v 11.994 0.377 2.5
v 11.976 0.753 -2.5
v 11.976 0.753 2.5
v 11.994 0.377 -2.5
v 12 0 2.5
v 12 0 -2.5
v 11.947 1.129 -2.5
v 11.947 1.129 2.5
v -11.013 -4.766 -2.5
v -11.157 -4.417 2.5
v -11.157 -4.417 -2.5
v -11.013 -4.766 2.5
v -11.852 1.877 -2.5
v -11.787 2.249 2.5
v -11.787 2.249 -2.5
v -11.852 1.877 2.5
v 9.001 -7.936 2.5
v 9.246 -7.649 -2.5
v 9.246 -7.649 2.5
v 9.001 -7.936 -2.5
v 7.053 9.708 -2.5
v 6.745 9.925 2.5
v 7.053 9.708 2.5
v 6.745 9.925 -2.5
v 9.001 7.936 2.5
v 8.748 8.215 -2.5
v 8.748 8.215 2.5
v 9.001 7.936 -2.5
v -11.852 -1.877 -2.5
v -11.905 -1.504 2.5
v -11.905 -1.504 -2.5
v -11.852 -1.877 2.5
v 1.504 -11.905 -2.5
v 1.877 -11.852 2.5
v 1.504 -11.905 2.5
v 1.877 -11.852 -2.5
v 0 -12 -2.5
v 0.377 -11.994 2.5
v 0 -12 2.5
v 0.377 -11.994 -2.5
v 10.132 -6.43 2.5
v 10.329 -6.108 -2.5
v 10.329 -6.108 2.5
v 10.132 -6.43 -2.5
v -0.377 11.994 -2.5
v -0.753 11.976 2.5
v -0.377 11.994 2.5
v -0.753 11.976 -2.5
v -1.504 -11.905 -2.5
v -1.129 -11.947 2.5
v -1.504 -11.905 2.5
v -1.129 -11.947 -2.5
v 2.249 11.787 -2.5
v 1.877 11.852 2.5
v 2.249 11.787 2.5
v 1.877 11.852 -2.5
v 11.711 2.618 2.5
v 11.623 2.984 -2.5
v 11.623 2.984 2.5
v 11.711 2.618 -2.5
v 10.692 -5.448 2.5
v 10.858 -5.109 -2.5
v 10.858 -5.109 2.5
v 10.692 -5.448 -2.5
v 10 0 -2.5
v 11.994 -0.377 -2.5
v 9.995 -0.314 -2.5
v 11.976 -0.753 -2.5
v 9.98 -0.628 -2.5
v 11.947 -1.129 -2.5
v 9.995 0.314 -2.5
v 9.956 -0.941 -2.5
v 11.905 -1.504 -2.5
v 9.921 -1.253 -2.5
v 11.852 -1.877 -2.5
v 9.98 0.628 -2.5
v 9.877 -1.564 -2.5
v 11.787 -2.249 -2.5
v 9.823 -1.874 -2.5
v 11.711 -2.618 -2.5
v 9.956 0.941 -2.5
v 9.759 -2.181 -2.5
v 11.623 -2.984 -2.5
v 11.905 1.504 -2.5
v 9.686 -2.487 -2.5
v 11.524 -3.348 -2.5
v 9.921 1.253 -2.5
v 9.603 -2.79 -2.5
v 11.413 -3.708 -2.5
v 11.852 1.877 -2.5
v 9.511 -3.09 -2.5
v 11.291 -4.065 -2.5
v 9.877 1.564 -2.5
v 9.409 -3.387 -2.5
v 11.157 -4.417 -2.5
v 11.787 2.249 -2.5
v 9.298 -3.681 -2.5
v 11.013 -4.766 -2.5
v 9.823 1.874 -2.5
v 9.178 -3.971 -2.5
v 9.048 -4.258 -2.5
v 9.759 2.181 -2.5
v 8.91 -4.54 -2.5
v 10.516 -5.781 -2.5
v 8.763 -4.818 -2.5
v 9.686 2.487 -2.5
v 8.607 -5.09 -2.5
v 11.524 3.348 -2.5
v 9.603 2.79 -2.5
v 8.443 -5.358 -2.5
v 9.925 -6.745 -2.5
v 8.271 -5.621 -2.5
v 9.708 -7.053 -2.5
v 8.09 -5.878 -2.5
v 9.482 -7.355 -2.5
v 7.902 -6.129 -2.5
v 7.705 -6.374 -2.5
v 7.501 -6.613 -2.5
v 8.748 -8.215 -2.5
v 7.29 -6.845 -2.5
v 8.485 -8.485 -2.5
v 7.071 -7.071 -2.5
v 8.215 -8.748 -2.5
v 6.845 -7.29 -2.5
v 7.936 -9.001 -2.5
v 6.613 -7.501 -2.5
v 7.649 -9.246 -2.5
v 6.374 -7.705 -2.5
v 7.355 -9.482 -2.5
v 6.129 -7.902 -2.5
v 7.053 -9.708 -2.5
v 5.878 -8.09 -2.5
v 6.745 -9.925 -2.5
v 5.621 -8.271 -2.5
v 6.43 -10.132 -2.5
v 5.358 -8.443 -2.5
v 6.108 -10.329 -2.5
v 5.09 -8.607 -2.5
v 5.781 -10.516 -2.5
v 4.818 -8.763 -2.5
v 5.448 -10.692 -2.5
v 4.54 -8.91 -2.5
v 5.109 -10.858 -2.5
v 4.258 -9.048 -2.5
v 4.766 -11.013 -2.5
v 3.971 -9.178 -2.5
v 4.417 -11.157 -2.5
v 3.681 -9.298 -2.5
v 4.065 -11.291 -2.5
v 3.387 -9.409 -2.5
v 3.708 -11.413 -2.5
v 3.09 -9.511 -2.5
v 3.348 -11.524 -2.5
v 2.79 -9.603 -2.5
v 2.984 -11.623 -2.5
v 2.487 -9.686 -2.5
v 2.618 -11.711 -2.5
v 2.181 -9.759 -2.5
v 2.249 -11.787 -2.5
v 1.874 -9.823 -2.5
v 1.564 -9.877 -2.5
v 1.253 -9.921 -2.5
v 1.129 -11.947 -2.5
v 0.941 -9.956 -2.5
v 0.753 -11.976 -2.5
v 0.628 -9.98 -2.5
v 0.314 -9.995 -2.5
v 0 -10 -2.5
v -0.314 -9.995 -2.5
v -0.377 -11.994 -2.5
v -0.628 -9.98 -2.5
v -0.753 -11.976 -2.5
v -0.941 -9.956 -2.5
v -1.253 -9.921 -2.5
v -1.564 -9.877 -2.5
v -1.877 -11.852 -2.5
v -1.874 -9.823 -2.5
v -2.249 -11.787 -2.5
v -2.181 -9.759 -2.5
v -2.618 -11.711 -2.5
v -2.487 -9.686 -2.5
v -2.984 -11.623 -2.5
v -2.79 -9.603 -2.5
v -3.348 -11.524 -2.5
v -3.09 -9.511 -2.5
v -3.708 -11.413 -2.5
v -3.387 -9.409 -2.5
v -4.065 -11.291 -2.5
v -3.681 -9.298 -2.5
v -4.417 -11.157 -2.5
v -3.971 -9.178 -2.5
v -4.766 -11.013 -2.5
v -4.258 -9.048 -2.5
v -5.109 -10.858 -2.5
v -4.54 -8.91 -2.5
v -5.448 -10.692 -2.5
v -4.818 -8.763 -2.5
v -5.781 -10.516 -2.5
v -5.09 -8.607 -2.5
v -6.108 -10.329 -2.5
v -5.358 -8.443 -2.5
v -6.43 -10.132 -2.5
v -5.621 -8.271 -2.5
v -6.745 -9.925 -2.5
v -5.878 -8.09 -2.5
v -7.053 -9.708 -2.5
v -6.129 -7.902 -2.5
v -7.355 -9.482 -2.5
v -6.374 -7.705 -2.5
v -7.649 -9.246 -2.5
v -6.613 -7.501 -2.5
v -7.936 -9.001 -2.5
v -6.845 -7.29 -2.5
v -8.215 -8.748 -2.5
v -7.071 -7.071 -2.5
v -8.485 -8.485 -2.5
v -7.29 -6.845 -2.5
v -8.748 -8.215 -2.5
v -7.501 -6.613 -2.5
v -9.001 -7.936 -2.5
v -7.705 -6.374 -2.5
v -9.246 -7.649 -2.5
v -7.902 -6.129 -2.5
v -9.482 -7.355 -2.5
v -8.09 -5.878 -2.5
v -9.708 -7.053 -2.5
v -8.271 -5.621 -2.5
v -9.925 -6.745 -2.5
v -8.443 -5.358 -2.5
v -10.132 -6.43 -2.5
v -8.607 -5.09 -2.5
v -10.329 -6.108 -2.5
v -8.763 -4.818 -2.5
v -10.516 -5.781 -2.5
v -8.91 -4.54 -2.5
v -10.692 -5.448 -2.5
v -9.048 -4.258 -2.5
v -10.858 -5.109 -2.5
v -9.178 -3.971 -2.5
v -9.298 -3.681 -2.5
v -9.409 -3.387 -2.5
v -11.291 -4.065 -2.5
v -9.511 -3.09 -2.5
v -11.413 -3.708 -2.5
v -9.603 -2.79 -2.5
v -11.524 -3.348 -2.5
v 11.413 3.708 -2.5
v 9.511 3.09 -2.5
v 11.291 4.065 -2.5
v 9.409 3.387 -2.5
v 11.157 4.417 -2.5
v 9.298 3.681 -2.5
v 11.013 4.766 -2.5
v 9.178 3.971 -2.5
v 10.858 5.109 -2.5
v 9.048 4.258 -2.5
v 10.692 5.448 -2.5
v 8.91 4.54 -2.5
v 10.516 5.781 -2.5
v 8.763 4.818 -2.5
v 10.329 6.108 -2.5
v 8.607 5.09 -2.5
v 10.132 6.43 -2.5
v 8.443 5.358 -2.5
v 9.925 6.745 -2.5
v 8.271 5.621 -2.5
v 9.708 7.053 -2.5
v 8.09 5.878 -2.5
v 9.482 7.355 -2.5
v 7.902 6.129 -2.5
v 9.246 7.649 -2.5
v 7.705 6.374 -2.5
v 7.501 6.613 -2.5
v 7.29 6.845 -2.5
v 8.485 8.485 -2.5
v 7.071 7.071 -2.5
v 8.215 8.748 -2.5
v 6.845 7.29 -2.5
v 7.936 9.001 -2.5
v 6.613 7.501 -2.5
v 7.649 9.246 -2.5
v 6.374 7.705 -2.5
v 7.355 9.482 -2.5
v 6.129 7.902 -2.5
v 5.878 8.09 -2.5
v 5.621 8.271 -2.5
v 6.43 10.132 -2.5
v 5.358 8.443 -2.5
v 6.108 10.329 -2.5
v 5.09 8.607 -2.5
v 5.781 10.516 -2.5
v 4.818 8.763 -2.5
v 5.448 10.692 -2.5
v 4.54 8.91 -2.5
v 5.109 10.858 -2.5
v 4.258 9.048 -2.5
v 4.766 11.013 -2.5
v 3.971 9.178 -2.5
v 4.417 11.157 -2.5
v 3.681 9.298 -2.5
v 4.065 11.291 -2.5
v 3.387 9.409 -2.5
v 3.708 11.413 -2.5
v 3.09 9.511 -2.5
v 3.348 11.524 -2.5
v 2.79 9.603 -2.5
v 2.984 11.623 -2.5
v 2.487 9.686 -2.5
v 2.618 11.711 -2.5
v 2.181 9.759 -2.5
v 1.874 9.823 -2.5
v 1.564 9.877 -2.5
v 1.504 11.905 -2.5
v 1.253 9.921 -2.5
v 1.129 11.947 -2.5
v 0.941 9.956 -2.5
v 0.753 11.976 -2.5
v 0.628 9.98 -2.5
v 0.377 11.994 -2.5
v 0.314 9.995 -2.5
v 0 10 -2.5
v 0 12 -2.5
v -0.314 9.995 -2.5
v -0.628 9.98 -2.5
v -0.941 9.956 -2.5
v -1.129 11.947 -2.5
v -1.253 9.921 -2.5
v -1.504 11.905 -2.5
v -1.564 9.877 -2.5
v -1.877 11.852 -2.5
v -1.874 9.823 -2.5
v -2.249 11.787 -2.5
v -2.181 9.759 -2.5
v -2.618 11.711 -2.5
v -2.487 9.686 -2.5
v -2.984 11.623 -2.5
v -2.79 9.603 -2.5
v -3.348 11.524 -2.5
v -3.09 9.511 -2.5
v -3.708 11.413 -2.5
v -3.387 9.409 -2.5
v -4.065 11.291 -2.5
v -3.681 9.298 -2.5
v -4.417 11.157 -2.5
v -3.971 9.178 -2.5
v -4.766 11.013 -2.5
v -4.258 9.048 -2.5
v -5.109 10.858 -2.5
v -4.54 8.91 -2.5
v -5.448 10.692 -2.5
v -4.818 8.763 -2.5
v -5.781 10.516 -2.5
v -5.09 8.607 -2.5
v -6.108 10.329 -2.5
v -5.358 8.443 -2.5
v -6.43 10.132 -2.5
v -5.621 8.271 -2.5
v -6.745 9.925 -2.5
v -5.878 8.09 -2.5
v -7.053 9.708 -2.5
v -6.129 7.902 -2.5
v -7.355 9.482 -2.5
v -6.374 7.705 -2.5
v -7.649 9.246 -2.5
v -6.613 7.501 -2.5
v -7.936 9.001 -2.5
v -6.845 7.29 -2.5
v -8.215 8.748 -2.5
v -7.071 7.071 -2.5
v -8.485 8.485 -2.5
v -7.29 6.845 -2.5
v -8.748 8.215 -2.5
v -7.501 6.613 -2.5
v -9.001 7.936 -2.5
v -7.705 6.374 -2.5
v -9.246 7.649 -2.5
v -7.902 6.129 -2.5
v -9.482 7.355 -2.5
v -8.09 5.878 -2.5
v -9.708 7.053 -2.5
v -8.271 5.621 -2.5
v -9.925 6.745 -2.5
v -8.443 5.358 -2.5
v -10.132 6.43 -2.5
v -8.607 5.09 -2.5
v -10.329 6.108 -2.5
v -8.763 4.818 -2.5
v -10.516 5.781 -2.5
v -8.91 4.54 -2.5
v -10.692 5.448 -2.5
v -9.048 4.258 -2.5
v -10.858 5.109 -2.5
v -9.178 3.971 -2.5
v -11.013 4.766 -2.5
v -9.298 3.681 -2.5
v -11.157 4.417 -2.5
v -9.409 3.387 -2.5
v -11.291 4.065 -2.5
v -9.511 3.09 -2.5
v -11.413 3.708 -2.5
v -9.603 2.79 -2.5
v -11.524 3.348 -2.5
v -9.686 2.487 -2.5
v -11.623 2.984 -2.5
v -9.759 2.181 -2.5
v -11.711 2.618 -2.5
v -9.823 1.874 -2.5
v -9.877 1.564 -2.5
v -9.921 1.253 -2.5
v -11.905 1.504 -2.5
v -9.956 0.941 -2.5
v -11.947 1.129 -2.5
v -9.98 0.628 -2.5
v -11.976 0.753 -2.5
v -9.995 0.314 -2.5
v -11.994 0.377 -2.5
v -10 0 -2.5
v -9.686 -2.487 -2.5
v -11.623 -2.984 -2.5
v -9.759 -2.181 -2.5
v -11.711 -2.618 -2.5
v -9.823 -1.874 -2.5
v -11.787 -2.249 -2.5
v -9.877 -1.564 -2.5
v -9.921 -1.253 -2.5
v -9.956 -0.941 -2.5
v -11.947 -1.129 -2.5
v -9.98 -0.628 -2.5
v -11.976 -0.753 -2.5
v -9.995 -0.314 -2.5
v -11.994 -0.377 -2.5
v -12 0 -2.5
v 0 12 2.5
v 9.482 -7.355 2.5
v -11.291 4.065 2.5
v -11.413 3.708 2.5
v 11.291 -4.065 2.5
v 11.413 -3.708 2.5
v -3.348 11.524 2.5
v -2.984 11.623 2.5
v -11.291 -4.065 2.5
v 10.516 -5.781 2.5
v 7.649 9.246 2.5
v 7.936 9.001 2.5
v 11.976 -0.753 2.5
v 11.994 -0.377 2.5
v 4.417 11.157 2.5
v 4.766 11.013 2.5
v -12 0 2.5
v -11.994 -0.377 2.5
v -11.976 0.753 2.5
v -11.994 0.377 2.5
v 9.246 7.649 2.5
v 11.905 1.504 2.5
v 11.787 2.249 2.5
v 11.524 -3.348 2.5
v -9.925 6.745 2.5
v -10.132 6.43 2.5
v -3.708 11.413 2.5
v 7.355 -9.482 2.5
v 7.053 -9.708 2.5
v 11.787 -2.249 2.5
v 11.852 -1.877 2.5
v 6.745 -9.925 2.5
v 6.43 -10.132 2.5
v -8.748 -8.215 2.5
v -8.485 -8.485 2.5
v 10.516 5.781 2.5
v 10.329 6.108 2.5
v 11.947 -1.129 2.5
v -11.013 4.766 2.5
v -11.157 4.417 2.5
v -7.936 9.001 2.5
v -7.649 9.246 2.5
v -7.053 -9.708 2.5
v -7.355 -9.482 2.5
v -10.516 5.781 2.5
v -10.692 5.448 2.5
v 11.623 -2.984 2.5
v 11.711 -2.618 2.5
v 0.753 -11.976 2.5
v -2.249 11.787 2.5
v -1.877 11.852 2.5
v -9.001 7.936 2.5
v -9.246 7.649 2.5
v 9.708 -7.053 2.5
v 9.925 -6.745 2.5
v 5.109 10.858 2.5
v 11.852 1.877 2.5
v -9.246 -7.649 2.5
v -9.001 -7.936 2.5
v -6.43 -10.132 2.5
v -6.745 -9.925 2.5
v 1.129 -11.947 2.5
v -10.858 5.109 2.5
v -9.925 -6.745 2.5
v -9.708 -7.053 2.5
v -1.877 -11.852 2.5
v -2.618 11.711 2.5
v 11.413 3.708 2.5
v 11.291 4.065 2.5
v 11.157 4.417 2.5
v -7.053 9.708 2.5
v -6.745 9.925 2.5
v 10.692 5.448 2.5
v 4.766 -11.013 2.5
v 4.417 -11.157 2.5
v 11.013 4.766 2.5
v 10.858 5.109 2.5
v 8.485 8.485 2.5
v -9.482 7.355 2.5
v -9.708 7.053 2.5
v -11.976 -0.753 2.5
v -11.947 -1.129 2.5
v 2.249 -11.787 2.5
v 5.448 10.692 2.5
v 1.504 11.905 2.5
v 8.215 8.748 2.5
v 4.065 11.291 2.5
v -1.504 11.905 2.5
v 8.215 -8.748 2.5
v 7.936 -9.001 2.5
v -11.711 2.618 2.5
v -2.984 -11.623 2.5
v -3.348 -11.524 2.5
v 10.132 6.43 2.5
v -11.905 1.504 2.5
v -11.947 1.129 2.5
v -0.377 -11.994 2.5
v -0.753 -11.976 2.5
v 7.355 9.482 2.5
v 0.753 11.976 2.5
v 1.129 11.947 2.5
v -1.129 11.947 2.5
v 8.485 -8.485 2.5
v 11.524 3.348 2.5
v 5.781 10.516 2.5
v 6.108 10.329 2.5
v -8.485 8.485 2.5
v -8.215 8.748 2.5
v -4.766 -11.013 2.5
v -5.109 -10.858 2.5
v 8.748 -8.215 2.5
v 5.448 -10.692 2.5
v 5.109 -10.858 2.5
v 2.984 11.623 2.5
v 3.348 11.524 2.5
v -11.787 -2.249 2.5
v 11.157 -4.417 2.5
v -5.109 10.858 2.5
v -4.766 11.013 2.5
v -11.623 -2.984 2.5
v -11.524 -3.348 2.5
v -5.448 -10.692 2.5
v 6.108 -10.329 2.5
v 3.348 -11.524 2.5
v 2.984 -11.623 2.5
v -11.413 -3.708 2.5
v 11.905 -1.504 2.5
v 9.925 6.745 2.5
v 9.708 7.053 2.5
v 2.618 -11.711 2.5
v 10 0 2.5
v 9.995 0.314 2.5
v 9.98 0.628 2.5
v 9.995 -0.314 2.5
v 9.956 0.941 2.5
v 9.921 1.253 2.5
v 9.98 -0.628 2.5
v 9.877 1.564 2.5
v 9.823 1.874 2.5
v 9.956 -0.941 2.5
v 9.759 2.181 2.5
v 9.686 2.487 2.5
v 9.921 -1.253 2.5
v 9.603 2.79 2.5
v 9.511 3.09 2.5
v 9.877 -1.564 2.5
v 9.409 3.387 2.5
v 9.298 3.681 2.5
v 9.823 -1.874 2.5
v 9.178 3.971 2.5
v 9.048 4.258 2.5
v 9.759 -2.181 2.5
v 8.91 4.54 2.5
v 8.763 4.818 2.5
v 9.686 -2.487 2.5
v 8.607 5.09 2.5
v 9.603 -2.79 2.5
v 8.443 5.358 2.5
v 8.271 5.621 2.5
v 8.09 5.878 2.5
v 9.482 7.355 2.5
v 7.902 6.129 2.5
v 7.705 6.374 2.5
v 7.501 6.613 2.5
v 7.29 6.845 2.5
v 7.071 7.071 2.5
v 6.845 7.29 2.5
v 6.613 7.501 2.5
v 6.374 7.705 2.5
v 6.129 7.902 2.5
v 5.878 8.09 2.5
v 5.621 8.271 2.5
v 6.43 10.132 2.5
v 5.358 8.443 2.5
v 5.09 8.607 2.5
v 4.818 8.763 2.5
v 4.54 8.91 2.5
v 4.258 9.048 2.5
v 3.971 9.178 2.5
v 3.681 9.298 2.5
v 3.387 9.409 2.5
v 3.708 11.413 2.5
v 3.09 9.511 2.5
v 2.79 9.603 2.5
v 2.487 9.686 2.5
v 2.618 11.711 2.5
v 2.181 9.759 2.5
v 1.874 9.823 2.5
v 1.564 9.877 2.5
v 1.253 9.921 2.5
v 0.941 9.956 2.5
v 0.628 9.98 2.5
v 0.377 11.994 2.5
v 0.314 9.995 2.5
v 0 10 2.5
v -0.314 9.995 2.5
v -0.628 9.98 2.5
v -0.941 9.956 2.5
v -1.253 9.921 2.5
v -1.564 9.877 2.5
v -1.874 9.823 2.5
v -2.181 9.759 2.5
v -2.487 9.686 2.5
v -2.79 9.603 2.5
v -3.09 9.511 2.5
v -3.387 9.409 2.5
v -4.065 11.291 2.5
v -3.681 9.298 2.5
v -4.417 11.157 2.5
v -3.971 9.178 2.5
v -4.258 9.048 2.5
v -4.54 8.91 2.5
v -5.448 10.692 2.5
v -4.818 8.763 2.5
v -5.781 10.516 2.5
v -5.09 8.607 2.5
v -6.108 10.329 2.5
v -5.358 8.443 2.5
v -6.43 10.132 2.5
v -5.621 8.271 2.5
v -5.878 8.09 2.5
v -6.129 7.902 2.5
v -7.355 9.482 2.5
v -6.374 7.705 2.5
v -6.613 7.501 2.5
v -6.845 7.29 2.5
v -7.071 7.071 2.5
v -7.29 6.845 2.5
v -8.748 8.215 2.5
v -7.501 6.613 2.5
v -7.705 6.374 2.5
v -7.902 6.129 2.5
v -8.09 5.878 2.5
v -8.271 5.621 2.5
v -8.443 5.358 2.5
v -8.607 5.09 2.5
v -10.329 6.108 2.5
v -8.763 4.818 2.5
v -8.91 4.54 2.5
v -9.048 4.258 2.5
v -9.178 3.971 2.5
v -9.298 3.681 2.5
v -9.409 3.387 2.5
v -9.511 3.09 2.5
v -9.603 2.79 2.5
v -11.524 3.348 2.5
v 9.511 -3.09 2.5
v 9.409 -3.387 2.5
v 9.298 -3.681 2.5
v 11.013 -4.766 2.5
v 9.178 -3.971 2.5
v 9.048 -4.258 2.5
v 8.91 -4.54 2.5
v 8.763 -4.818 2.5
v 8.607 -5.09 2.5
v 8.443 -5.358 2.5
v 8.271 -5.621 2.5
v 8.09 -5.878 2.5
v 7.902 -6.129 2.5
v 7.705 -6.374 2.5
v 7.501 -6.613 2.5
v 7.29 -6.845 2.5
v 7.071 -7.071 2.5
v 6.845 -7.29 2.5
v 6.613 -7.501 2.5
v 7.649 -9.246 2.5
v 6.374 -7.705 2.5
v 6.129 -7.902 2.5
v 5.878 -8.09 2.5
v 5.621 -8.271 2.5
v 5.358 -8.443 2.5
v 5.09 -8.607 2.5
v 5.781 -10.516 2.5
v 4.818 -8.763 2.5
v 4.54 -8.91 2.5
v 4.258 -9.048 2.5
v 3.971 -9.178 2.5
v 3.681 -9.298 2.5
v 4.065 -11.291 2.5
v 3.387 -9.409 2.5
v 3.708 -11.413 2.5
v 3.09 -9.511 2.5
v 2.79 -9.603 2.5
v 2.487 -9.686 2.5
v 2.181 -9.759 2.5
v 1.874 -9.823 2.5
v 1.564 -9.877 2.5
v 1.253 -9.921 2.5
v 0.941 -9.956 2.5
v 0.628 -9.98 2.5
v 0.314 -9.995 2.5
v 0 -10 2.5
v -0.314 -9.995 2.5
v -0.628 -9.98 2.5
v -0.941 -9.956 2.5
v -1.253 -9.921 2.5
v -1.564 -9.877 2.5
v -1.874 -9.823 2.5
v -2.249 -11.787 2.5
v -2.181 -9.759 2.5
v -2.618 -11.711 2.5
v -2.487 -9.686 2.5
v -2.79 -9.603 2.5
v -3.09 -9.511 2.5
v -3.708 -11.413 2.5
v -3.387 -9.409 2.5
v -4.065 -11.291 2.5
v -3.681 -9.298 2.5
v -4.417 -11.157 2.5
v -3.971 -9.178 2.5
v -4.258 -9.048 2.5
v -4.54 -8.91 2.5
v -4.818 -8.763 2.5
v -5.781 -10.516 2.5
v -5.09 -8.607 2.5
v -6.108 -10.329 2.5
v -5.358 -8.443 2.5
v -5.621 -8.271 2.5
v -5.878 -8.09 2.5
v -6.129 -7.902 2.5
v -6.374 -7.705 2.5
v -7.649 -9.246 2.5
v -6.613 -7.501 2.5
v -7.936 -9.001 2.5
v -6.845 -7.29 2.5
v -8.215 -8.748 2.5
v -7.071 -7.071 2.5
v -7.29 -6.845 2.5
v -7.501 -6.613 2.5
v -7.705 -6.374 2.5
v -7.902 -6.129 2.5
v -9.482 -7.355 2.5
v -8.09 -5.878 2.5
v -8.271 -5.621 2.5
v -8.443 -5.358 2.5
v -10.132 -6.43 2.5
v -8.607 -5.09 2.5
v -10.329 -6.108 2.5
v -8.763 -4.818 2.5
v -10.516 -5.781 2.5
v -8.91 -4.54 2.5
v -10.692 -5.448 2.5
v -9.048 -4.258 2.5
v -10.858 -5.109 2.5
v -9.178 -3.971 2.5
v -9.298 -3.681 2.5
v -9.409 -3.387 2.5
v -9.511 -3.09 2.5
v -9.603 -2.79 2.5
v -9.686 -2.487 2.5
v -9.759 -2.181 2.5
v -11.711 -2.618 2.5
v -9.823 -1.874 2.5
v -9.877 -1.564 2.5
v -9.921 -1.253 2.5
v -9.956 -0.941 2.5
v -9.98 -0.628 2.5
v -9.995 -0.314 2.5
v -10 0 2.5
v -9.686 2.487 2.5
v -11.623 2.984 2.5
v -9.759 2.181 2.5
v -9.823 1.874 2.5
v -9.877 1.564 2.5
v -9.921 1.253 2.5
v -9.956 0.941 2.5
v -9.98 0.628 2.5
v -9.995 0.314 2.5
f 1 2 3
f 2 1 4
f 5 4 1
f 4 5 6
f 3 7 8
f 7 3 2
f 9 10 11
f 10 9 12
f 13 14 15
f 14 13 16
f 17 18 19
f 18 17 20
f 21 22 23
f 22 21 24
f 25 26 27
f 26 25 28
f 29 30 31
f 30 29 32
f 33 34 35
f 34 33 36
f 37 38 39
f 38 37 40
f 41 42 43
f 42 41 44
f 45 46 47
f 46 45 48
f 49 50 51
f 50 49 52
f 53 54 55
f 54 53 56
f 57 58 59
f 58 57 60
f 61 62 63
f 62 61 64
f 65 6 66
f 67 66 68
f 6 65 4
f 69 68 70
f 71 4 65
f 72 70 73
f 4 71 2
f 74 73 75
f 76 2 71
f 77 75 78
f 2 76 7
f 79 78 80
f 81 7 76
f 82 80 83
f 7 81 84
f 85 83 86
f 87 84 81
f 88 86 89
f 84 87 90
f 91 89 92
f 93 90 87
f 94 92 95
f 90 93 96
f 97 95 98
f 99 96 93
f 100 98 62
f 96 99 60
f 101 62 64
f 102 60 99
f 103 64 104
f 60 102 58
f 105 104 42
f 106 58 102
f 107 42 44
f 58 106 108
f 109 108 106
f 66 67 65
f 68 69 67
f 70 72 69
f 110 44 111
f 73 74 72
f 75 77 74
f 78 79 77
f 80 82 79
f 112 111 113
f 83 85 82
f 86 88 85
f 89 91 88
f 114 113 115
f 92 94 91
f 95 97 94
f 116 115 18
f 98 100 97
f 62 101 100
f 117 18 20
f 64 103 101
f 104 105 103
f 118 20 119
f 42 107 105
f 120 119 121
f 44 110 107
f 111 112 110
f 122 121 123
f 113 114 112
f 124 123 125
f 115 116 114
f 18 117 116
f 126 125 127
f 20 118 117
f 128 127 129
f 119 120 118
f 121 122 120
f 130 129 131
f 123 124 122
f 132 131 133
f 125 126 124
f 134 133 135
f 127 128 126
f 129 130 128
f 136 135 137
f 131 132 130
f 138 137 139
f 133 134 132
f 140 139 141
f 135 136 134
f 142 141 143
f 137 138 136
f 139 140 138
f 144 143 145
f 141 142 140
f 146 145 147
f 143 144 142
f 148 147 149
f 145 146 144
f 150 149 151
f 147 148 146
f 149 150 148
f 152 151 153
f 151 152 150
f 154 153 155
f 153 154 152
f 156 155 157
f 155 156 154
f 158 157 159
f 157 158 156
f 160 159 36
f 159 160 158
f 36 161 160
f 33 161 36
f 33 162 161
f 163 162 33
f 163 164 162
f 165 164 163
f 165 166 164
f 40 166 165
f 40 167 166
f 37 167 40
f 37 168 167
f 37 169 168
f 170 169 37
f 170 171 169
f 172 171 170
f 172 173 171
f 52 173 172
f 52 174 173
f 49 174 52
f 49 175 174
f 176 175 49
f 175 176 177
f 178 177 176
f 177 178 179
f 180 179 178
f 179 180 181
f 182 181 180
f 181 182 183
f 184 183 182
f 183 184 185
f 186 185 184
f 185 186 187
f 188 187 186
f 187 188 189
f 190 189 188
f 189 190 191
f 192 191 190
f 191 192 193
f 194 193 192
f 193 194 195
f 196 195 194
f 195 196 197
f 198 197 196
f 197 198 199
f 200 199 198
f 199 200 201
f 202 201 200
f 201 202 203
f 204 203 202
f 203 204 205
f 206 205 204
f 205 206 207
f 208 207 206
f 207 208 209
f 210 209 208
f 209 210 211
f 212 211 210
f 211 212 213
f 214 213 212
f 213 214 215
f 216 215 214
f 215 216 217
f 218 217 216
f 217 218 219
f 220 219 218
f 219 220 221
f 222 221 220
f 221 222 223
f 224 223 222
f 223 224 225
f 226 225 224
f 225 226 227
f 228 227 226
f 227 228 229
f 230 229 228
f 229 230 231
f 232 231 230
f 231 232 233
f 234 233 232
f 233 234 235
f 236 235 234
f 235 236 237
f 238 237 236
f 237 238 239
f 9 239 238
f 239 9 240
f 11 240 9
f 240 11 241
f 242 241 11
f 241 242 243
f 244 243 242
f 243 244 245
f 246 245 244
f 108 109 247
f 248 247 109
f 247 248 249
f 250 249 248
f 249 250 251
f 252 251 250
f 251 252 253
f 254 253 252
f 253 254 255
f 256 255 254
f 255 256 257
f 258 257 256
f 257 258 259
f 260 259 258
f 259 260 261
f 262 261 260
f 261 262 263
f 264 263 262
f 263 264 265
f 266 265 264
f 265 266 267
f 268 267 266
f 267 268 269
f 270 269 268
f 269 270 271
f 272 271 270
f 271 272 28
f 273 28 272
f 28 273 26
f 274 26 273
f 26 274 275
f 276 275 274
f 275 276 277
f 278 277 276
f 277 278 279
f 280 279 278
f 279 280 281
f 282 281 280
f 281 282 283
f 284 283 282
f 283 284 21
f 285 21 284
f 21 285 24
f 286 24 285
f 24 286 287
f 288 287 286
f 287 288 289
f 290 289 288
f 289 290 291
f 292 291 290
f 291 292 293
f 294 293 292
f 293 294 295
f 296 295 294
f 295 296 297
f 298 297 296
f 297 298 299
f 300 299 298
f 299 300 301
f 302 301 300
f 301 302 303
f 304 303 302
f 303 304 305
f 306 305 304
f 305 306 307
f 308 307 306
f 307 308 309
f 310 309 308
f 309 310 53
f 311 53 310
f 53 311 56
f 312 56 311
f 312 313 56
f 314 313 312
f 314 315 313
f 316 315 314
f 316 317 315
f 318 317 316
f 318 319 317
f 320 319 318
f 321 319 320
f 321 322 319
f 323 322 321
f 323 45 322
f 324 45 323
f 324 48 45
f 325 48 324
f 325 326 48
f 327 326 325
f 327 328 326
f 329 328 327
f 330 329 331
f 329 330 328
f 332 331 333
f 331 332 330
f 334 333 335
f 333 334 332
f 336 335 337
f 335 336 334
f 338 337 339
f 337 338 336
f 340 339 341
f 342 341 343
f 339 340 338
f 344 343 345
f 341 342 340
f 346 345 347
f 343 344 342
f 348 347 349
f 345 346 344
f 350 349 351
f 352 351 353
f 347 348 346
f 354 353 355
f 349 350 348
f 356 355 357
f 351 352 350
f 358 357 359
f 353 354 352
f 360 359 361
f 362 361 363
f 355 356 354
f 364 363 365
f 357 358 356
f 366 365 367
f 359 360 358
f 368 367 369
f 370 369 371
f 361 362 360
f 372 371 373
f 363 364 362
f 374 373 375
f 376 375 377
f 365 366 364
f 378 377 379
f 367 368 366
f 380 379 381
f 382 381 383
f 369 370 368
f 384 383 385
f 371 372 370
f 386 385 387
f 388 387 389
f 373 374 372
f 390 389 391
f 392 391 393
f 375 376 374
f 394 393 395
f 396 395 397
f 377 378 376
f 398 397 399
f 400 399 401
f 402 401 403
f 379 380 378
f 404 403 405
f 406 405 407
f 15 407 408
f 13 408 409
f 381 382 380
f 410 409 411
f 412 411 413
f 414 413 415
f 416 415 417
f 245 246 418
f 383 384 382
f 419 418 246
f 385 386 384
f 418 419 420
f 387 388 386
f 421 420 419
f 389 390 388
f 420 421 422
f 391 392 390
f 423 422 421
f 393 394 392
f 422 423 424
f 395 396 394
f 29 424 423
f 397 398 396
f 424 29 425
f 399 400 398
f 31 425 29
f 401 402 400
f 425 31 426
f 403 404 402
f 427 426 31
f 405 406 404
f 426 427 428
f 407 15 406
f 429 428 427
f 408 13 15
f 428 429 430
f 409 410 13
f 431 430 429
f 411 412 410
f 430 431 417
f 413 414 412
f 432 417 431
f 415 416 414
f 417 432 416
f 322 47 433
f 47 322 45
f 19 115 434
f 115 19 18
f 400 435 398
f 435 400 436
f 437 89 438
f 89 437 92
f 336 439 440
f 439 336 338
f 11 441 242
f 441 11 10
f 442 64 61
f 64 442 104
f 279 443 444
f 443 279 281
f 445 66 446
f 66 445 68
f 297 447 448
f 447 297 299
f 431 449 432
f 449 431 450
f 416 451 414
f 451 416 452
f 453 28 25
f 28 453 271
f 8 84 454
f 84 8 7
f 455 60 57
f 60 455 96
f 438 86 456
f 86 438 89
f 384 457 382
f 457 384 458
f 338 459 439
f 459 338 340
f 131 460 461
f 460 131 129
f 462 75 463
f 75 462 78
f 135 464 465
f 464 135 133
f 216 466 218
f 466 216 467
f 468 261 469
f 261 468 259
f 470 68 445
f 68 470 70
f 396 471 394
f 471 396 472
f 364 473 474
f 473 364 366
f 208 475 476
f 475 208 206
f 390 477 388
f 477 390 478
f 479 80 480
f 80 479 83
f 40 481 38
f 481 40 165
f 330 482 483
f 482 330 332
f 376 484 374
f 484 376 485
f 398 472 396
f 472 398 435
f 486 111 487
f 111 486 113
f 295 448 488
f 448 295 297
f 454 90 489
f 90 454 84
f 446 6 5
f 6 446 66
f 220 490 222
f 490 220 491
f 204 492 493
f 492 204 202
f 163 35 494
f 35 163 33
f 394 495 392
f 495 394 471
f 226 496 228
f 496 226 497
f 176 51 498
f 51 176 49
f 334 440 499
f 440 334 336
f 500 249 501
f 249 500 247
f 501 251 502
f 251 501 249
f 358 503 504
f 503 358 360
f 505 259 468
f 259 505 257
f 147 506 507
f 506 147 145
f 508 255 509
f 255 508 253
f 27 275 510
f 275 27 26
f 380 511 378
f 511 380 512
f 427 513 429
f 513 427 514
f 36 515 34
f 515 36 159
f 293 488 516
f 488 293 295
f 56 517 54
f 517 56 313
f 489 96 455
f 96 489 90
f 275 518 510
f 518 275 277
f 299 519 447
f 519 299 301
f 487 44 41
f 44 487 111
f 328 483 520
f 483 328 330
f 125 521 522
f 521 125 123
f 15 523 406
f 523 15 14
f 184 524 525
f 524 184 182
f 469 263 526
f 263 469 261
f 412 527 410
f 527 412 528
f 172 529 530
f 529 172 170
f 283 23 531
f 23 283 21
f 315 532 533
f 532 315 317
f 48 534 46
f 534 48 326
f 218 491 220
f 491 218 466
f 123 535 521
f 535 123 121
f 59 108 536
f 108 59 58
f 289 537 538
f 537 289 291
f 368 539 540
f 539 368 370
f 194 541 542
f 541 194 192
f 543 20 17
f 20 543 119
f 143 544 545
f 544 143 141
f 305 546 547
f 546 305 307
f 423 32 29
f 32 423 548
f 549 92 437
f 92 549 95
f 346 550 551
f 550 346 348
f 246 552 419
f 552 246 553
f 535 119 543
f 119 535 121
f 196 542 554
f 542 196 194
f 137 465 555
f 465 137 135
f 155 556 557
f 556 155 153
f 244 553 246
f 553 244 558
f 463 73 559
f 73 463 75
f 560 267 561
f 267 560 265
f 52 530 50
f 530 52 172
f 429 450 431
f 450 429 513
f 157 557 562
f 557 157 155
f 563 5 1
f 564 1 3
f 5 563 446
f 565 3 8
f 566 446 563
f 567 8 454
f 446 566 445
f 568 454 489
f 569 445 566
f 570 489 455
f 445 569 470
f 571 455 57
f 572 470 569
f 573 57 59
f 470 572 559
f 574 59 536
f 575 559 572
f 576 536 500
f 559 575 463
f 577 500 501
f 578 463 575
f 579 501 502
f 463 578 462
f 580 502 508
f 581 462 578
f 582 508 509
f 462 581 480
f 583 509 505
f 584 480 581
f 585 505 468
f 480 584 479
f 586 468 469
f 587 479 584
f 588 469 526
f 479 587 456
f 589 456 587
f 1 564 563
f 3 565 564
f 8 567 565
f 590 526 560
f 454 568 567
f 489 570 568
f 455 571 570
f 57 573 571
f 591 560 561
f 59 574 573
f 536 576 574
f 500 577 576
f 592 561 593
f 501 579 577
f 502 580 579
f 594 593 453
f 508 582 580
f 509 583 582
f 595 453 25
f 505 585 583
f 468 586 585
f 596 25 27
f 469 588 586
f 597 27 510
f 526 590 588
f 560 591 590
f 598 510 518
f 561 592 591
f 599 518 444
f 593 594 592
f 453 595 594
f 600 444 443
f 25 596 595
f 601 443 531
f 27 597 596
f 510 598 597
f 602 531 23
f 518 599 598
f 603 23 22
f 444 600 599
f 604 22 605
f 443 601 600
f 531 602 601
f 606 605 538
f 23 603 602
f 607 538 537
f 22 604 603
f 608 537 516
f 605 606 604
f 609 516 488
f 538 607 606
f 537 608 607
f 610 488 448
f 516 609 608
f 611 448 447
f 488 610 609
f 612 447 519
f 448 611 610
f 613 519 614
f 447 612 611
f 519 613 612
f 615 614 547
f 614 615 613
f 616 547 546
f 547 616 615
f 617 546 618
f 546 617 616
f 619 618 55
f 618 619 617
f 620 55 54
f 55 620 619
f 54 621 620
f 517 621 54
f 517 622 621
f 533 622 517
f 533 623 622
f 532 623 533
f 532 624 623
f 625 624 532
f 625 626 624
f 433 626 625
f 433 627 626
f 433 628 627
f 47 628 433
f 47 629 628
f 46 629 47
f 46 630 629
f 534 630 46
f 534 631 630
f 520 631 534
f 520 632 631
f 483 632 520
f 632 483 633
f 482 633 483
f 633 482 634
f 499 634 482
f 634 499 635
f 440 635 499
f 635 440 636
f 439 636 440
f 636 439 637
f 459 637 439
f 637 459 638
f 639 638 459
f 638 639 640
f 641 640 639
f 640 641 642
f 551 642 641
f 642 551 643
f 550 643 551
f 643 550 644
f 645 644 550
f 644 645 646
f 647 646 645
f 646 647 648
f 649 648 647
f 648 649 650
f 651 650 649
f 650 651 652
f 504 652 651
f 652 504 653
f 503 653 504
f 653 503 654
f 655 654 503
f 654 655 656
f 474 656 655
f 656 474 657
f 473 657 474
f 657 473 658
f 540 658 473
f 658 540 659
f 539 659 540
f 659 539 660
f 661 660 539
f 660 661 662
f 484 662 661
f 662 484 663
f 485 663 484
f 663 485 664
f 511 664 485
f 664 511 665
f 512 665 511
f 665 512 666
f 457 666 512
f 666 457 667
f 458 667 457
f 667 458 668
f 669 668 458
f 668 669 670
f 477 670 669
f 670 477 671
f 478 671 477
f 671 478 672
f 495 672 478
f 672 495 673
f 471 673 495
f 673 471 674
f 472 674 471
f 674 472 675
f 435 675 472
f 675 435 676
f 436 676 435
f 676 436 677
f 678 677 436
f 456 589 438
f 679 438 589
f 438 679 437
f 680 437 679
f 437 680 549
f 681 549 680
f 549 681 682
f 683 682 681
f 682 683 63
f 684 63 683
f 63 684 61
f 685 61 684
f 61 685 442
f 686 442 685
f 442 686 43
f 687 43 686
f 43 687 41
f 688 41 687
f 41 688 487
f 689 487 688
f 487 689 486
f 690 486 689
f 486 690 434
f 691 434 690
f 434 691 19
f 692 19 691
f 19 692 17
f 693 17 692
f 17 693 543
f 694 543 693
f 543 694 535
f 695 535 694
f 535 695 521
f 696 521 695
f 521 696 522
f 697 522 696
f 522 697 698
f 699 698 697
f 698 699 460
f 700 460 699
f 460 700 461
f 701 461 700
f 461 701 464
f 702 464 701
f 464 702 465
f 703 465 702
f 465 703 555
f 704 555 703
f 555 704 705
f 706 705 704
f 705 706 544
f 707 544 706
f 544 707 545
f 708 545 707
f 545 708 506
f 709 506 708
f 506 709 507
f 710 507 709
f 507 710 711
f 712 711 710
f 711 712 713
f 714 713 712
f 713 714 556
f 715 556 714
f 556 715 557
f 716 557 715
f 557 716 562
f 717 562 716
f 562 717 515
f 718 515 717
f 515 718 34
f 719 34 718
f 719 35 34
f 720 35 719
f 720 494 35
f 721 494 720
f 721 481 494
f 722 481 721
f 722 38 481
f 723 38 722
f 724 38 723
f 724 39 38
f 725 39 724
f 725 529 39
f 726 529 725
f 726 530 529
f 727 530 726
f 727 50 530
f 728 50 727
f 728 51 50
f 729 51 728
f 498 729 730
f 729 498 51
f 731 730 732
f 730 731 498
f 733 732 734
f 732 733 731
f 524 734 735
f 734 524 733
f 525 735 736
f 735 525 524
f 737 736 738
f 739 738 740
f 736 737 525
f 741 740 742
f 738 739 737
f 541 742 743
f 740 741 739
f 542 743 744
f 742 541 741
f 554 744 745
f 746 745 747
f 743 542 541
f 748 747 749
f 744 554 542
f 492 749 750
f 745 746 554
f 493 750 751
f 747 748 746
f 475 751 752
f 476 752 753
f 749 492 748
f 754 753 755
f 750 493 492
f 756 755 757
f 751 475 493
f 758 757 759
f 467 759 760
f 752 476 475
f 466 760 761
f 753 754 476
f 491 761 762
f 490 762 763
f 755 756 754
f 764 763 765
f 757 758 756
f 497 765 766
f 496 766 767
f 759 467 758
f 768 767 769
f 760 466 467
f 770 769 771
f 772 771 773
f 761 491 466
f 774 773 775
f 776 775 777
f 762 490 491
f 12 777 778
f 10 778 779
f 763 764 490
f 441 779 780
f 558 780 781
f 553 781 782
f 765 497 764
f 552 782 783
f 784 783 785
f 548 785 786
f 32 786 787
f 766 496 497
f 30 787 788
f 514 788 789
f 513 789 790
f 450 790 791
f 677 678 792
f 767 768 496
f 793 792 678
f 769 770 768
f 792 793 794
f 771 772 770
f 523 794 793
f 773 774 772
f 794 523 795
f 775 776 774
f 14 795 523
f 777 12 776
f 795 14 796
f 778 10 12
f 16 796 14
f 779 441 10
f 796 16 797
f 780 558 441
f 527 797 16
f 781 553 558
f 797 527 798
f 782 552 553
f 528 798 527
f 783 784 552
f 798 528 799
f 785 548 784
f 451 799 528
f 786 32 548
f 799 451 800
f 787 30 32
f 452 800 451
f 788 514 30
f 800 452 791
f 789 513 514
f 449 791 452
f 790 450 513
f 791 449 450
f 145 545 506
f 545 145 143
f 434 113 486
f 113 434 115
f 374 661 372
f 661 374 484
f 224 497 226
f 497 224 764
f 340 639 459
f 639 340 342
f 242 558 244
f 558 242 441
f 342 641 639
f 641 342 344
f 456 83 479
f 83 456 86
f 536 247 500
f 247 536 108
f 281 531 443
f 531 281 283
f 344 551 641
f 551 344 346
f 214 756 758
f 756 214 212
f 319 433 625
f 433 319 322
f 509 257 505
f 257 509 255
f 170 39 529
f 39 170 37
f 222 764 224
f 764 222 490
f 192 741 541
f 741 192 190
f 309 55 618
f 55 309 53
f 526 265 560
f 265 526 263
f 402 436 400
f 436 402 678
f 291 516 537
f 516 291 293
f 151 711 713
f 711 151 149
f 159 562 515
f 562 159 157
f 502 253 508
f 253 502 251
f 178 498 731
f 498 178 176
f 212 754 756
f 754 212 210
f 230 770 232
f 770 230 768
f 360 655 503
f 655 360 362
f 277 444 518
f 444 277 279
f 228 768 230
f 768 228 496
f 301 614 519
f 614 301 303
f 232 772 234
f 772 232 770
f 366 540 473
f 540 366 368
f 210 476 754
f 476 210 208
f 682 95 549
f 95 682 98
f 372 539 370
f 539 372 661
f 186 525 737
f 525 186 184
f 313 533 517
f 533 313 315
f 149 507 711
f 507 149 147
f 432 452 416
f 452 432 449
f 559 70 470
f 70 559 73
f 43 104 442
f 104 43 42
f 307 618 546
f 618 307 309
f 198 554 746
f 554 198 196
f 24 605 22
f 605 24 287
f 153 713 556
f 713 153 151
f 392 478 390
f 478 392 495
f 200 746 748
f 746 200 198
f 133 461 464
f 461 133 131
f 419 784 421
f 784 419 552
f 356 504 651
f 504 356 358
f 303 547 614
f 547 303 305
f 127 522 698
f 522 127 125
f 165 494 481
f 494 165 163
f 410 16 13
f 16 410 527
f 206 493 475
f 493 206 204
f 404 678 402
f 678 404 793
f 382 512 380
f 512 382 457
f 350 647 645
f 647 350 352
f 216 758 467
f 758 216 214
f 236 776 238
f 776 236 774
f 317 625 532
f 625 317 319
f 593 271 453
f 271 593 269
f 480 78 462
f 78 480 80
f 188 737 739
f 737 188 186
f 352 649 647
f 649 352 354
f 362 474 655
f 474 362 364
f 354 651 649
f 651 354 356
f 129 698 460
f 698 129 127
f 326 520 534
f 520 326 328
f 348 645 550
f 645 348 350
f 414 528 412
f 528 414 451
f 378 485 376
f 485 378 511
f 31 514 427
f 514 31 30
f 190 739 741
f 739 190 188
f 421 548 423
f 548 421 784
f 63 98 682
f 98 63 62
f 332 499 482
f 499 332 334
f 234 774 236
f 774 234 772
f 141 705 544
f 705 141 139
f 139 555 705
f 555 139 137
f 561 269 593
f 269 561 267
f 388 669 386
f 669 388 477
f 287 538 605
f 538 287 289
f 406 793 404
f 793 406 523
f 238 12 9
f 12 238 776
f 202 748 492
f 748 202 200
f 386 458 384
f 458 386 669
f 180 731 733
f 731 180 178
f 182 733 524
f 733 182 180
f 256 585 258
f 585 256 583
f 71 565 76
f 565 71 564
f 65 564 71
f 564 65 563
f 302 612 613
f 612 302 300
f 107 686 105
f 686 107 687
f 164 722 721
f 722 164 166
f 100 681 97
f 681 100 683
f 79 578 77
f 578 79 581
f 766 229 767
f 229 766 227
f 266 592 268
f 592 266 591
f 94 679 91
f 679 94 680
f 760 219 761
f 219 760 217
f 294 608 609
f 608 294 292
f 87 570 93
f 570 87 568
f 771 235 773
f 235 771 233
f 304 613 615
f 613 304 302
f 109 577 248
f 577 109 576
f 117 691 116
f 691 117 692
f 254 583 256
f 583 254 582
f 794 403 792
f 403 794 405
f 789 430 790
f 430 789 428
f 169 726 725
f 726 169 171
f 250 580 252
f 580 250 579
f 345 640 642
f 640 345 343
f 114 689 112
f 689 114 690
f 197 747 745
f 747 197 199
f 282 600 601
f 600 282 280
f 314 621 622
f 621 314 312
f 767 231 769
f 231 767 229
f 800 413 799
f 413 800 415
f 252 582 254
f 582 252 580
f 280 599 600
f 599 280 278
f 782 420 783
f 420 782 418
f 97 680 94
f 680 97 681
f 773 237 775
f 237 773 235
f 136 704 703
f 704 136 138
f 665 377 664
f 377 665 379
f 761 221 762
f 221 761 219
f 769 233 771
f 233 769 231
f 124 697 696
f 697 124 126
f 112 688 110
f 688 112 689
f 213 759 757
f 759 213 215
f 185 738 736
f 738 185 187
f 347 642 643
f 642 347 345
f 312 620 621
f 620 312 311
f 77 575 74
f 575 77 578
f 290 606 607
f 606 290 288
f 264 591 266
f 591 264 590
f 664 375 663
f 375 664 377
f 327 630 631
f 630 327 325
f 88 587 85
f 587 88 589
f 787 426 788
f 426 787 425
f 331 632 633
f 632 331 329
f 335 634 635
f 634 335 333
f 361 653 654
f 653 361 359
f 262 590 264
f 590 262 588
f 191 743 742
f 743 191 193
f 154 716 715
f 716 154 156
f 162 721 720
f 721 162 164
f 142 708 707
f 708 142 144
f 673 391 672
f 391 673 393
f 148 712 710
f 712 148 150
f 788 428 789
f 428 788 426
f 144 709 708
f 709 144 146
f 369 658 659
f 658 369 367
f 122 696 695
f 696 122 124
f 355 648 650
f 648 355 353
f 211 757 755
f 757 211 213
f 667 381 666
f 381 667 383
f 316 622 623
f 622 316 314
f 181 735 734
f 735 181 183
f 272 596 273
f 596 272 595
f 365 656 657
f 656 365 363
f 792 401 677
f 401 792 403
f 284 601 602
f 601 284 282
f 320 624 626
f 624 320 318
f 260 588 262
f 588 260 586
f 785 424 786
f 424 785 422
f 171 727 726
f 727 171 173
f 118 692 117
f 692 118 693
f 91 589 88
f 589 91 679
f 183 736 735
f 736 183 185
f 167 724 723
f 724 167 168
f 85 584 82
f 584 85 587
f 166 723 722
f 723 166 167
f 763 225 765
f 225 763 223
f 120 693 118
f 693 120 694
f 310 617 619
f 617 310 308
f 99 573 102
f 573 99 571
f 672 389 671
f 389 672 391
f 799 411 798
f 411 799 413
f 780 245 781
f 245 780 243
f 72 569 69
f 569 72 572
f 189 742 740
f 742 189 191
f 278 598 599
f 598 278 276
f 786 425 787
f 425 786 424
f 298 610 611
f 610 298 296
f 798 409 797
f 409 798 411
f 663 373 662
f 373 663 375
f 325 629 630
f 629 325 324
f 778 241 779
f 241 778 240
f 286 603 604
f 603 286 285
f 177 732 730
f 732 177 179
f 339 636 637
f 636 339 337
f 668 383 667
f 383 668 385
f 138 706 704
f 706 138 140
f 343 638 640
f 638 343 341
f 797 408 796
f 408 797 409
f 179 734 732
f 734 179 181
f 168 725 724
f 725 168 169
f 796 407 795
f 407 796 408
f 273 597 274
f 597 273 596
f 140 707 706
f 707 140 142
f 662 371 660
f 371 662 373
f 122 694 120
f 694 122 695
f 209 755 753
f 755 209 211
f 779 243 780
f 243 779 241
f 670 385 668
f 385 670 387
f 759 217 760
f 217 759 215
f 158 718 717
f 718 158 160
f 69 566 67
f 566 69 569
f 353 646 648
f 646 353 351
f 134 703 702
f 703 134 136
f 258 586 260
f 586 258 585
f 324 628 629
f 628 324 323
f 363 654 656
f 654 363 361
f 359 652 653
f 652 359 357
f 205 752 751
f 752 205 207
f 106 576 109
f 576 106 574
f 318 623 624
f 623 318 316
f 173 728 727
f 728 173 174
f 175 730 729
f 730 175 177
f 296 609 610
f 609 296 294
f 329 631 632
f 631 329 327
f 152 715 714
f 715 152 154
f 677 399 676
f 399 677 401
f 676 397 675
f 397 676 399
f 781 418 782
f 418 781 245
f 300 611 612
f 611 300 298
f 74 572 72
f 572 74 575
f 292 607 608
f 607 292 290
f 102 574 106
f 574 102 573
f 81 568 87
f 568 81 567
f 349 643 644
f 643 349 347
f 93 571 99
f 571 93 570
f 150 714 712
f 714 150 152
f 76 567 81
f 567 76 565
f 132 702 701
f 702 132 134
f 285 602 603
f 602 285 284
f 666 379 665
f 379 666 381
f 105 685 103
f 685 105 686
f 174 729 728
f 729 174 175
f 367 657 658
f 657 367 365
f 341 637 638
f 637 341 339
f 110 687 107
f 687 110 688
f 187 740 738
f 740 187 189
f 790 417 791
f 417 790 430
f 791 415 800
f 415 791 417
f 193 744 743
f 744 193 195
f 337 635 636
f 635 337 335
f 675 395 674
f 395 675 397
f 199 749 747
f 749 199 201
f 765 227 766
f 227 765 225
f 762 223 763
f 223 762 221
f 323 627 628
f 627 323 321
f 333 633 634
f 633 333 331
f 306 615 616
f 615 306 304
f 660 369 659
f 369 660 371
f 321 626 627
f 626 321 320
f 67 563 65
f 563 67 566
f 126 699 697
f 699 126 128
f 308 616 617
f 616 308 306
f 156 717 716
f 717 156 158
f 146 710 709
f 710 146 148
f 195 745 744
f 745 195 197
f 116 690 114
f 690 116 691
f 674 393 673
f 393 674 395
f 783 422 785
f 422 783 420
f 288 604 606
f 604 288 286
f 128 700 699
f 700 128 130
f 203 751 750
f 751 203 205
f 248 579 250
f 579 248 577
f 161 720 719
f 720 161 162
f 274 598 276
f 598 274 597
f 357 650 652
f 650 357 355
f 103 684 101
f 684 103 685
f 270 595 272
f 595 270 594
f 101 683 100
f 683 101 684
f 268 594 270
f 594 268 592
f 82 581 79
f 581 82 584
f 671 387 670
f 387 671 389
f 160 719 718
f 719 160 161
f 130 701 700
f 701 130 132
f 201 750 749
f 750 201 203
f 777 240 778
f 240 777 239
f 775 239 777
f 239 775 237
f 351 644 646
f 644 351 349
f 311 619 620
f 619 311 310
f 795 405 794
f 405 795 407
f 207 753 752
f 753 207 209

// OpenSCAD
//Ring ID (mm)
ID = 20;

//Ring Height (mm)
height = 5;

//Thickness
t=2;

//Resolution
resolution = 200;


difference()
		{cylinder (h = height, r = t+ID/2, $fn = resolution, center = true);
            
        cylinder (h = height * 1.5, r = ID/2, $fn = resolution, center = true);}
